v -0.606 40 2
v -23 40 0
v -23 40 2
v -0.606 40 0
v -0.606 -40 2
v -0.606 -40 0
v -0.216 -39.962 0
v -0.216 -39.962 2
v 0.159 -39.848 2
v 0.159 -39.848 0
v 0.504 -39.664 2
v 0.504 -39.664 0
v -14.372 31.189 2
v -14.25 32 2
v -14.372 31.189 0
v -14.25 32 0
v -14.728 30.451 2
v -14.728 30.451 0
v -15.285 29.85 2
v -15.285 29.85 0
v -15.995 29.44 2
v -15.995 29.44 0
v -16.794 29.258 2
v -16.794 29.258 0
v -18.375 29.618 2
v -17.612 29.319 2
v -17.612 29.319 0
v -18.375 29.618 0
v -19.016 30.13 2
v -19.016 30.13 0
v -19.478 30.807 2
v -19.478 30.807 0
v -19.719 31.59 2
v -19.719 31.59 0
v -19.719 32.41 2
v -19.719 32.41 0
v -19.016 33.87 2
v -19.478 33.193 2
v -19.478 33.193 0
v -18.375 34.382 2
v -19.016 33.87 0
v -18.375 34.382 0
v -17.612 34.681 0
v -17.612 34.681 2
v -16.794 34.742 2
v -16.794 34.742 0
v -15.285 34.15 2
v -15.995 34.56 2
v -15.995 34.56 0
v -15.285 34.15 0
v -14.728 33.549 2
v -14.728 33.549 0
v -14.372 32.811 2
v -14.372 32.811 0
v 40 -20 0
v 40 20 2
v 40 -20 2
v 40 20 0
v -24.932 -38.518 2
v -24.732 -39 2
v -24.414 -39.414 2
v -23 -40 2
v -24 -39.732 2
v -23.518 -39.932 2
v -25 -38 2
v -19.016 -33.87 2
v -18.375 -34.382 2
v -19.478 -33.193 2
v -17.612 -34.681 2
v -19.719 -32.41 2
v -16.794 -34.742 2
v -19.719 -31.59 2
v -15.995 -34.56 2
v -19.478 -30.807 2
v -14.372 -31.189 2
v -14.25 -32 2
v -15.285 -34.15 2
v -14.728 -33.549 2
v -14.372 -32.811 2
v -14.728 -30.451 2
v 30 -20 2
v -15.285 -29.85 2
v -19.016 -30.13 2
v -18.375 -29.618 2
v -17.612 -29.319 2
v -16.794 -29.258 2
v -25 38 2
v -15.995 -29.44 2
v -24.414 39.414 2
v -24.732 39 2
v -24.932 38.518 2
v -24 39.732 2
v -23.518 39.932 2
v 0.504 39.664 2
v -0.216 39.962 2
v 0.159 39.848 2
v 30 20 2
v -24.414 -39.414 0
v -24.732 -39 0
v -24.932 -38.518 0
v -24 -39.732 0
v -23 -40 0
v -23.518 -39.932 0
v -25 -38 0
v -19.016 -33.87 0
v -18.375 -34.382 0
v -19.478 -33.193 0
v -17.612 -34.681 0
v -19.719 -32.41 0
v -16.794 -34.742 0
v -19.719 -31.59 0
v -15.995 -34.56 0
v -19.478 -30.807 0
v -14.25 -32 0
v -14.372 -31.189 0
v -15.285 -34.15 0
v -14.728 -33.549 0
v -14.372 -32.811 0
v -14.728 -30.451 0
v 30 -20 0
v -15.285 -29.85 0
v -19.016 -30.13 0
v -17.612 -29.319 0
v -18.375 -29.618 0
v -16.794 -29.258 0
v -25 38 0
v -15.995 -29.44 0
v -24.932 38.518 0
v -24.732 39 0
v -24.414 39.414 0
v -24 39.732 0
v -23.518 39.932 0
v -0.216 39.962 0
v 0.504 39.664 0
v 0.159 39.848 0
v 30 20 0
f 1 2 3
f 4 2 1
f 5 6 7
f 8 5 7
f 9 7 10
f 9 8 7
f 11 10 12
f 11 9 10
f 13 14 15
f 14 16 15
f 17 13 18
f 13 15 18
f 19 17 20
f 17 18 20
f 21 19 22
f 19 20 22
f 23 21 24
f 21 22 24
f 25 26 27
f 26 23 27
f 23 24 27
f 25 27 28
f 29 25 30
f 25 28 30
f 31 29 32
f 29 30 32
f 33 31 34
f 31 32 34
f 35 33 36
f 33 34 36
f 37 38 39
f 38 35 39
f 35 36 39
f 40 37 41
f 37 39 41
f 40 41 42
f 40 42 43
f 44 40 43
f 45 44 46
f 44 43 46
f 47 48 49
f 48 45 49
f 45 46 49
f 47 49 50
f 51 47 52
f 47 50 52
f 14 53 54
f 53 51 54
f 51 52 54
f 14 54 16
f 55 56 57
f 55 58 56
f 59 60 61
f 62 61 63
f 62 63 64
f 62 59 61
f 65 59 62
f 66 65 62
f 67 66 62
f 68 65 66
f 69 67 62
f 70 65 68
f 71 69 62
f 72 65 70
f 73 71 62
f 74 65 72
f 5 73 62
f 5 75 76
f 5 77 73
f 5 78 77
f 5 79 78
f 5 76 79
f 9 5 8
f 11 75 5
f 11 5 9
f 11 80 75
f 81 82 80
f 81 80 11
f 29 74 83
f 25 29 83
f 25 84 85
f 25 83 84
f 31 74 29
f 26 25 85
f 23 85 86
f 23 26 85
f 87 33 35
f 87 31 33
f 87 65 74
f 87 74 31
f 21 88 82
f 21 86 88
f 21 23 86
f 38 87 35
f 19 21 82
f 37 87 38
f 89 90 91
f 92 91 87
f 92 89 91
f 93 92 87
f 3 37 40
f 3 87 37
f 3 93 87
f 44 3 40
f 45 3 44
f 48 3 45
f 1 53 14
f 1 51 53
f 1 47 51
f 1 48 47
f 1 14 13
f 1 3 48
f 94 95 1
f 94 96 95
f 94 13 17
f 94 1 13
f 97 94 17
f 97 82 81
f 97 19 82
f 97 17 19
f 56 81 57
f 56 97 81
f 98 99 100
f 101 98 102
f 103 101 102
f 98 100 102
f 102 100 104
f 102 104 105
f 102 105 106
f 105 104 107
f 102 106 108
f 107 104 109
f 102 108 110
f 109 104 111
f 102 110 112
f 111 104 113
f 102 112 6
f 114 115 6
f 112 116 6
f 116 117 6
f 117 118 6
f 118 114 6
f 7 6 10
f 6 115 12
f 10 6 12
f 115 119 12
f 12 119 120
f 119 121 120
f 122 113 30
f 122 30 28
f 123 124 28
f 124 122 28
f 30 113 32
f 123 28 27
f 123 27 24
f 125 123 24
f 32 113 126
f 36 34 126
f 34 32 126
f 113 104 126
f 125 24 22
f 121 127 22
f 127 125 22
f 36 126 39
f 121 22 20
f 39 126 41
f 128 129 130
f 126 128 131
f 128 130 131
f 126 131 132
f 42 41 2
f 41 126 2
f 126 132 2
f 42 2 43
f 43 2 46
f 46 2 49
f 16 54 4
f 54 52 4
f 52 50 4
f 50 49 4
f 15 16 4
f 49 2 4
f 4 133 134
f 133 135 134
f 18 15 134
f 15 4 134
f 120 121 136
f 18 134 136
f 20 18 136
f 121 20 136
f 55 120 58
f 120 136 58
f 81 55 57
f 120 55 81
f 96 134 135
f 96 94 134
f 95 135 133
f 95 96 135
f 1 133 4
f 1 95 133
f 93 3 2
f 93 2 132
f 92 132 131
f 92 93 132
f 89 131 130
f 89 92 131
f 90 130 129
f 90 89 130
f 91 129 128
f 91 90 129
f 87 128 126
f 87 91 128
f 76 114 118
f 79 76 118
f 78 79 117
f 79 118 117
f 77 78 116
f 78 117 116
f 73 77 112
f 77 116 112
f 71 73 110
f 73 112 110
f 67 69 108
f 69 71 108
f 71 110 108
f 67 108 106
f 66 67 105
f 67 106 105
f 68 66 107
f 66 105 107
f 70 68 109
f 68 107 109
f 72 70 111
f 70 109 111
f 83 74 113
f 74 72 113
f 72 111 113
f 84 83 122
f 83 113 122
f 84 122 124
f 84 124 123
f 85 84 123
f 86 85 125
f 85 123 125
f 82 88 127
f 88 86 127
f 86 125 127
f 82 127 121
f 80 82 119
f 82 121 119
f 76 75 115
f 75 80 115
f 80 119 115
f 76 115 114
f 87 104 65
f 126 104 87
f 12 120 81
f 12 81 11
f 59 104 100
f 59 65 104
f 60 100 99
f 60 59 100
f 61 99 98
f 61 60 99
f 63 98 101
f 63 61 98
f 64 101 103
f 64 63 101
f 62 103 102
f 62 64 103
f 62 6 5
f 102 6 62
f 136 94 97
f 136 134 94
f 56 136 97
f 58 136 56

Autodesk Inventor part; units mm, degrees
ref_plane "YZ Plane" through (0, 0, 0) normal (1, 0, 0) x (0, 1, 0)
ref_plane "XZ Plane" through (0, 0, 0) normal (0, 1, 0) x (-1, 0, 0)
ref_plane "XY Plane" through (0, 0, 0) normal (0, 0, 1) x (1, 0, 0)
sketch "Sketch13" plane through (0, 0, 0) normal (0, 0, 1) x (1, 0, 0)
  line L0 (-25, -40) -> (-25, 40)
  line L1 (-25, 40) -> (0, 40)
  line L2 (0, 40) -> (30, 20)
  line L3 (30, -20) -> (0, -40)
  line L4 (0, -40) -> (-25, -40)
  line L5 (30, 20) -> (40, 20)
  line L6 (40, 20) -> (40, -20)
  line L7 (40, -20) -> (30, -20)
  line L8 (30, -20) -> (30, 20) construction
  circle A0 centre (-17, 32) radius 2.75
  circle A1 centre (-17, -32) radius 2.75
  line L9 (-25, 0) -> (30, 0) construction
  point P0 (0, 0)
  point P1 (40, 0)
  dimension "d95" = 25
  dimension "d96" = 80
  dimension "d97" = 40
  dimension "d98" = 10
  dimension "d100" = 5.5
  dimension "d101" = 8
  dimension "d102" = 8
  dimension "d103" = 30
extrude "Plate5" add sketch "Sketch13" along normal blind 2
fillet "Fillet4" radius 2 4 edges at (-25, 40, 1) (0, 40, 1) (0, -40, 1) (-25, -40, 1)
equation "\"d104\" = Thickness"
equation "\"BendRadius\" = Thickness"
equation "\"BendReliefWidth\" = Thickness"
equation "\"BendReliefDepth\" = 0.5 * Thickness"
equation "\"CornerReliefSize\" = 4 * Thickness"
equation "\"MinimumRemnant\" = 2 * Thickness"
equation "\"TransitionRadius\" = BendRadius"
equation "\"JacobiRadiusSize\" = BendRadius"
equation "\"GapSize\" = Thickness"
equation "\"Thickness\" = 2"
properties part number "NDM 7.46 bracket floor stringer"
